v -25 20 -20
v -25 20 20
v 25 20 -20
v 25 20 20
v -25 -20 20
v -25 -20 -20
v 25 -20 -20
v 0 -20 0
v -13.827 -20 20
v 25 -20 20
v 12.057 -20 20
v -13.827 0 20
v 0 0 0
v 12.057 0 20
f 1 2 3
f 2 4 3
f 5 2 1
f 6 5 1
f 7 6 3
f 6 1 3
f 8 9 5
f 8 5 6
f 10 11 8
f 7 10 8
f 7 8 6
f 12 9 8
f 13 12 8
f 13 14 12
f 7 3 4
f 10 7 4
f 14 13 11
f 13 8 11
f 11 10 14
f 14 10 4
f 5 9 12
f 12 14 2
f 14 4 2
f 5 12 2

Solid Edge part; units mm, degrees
sketch "Sketch1" plane through (0, 0, 0) normal (0, -1, 0) x (1, 0, 0)
  line L0 (-25, -20) -> (25, -20)
  line L1 (25, -20) -> (25, 20)
  line L2 (25, 20) -> (-25, 20)
  line L3 (-25, 20) -> (-25, -20)
  dimension "D1" = 50
  dimension "D2" = 40
extrude "Protrusion1" add sketch "Sketch1" along normal mid plane 40
sketch "Sketch2" plane through (0, -20, 0) normal (0, -1, 0) x (1, 0, 0)
  line L0 (0, 20) -> (-13.8266, 20)
  line L1 (-13.8266, 20) -> (0, 0)
  line L2 (0, 0) -> (12.0573, 20)
  line L3 (12.0573, 20) -> (0, 20)
extrude "ExtrudedCutout_1" cut sketch "Sketch2" against normal blind 20
